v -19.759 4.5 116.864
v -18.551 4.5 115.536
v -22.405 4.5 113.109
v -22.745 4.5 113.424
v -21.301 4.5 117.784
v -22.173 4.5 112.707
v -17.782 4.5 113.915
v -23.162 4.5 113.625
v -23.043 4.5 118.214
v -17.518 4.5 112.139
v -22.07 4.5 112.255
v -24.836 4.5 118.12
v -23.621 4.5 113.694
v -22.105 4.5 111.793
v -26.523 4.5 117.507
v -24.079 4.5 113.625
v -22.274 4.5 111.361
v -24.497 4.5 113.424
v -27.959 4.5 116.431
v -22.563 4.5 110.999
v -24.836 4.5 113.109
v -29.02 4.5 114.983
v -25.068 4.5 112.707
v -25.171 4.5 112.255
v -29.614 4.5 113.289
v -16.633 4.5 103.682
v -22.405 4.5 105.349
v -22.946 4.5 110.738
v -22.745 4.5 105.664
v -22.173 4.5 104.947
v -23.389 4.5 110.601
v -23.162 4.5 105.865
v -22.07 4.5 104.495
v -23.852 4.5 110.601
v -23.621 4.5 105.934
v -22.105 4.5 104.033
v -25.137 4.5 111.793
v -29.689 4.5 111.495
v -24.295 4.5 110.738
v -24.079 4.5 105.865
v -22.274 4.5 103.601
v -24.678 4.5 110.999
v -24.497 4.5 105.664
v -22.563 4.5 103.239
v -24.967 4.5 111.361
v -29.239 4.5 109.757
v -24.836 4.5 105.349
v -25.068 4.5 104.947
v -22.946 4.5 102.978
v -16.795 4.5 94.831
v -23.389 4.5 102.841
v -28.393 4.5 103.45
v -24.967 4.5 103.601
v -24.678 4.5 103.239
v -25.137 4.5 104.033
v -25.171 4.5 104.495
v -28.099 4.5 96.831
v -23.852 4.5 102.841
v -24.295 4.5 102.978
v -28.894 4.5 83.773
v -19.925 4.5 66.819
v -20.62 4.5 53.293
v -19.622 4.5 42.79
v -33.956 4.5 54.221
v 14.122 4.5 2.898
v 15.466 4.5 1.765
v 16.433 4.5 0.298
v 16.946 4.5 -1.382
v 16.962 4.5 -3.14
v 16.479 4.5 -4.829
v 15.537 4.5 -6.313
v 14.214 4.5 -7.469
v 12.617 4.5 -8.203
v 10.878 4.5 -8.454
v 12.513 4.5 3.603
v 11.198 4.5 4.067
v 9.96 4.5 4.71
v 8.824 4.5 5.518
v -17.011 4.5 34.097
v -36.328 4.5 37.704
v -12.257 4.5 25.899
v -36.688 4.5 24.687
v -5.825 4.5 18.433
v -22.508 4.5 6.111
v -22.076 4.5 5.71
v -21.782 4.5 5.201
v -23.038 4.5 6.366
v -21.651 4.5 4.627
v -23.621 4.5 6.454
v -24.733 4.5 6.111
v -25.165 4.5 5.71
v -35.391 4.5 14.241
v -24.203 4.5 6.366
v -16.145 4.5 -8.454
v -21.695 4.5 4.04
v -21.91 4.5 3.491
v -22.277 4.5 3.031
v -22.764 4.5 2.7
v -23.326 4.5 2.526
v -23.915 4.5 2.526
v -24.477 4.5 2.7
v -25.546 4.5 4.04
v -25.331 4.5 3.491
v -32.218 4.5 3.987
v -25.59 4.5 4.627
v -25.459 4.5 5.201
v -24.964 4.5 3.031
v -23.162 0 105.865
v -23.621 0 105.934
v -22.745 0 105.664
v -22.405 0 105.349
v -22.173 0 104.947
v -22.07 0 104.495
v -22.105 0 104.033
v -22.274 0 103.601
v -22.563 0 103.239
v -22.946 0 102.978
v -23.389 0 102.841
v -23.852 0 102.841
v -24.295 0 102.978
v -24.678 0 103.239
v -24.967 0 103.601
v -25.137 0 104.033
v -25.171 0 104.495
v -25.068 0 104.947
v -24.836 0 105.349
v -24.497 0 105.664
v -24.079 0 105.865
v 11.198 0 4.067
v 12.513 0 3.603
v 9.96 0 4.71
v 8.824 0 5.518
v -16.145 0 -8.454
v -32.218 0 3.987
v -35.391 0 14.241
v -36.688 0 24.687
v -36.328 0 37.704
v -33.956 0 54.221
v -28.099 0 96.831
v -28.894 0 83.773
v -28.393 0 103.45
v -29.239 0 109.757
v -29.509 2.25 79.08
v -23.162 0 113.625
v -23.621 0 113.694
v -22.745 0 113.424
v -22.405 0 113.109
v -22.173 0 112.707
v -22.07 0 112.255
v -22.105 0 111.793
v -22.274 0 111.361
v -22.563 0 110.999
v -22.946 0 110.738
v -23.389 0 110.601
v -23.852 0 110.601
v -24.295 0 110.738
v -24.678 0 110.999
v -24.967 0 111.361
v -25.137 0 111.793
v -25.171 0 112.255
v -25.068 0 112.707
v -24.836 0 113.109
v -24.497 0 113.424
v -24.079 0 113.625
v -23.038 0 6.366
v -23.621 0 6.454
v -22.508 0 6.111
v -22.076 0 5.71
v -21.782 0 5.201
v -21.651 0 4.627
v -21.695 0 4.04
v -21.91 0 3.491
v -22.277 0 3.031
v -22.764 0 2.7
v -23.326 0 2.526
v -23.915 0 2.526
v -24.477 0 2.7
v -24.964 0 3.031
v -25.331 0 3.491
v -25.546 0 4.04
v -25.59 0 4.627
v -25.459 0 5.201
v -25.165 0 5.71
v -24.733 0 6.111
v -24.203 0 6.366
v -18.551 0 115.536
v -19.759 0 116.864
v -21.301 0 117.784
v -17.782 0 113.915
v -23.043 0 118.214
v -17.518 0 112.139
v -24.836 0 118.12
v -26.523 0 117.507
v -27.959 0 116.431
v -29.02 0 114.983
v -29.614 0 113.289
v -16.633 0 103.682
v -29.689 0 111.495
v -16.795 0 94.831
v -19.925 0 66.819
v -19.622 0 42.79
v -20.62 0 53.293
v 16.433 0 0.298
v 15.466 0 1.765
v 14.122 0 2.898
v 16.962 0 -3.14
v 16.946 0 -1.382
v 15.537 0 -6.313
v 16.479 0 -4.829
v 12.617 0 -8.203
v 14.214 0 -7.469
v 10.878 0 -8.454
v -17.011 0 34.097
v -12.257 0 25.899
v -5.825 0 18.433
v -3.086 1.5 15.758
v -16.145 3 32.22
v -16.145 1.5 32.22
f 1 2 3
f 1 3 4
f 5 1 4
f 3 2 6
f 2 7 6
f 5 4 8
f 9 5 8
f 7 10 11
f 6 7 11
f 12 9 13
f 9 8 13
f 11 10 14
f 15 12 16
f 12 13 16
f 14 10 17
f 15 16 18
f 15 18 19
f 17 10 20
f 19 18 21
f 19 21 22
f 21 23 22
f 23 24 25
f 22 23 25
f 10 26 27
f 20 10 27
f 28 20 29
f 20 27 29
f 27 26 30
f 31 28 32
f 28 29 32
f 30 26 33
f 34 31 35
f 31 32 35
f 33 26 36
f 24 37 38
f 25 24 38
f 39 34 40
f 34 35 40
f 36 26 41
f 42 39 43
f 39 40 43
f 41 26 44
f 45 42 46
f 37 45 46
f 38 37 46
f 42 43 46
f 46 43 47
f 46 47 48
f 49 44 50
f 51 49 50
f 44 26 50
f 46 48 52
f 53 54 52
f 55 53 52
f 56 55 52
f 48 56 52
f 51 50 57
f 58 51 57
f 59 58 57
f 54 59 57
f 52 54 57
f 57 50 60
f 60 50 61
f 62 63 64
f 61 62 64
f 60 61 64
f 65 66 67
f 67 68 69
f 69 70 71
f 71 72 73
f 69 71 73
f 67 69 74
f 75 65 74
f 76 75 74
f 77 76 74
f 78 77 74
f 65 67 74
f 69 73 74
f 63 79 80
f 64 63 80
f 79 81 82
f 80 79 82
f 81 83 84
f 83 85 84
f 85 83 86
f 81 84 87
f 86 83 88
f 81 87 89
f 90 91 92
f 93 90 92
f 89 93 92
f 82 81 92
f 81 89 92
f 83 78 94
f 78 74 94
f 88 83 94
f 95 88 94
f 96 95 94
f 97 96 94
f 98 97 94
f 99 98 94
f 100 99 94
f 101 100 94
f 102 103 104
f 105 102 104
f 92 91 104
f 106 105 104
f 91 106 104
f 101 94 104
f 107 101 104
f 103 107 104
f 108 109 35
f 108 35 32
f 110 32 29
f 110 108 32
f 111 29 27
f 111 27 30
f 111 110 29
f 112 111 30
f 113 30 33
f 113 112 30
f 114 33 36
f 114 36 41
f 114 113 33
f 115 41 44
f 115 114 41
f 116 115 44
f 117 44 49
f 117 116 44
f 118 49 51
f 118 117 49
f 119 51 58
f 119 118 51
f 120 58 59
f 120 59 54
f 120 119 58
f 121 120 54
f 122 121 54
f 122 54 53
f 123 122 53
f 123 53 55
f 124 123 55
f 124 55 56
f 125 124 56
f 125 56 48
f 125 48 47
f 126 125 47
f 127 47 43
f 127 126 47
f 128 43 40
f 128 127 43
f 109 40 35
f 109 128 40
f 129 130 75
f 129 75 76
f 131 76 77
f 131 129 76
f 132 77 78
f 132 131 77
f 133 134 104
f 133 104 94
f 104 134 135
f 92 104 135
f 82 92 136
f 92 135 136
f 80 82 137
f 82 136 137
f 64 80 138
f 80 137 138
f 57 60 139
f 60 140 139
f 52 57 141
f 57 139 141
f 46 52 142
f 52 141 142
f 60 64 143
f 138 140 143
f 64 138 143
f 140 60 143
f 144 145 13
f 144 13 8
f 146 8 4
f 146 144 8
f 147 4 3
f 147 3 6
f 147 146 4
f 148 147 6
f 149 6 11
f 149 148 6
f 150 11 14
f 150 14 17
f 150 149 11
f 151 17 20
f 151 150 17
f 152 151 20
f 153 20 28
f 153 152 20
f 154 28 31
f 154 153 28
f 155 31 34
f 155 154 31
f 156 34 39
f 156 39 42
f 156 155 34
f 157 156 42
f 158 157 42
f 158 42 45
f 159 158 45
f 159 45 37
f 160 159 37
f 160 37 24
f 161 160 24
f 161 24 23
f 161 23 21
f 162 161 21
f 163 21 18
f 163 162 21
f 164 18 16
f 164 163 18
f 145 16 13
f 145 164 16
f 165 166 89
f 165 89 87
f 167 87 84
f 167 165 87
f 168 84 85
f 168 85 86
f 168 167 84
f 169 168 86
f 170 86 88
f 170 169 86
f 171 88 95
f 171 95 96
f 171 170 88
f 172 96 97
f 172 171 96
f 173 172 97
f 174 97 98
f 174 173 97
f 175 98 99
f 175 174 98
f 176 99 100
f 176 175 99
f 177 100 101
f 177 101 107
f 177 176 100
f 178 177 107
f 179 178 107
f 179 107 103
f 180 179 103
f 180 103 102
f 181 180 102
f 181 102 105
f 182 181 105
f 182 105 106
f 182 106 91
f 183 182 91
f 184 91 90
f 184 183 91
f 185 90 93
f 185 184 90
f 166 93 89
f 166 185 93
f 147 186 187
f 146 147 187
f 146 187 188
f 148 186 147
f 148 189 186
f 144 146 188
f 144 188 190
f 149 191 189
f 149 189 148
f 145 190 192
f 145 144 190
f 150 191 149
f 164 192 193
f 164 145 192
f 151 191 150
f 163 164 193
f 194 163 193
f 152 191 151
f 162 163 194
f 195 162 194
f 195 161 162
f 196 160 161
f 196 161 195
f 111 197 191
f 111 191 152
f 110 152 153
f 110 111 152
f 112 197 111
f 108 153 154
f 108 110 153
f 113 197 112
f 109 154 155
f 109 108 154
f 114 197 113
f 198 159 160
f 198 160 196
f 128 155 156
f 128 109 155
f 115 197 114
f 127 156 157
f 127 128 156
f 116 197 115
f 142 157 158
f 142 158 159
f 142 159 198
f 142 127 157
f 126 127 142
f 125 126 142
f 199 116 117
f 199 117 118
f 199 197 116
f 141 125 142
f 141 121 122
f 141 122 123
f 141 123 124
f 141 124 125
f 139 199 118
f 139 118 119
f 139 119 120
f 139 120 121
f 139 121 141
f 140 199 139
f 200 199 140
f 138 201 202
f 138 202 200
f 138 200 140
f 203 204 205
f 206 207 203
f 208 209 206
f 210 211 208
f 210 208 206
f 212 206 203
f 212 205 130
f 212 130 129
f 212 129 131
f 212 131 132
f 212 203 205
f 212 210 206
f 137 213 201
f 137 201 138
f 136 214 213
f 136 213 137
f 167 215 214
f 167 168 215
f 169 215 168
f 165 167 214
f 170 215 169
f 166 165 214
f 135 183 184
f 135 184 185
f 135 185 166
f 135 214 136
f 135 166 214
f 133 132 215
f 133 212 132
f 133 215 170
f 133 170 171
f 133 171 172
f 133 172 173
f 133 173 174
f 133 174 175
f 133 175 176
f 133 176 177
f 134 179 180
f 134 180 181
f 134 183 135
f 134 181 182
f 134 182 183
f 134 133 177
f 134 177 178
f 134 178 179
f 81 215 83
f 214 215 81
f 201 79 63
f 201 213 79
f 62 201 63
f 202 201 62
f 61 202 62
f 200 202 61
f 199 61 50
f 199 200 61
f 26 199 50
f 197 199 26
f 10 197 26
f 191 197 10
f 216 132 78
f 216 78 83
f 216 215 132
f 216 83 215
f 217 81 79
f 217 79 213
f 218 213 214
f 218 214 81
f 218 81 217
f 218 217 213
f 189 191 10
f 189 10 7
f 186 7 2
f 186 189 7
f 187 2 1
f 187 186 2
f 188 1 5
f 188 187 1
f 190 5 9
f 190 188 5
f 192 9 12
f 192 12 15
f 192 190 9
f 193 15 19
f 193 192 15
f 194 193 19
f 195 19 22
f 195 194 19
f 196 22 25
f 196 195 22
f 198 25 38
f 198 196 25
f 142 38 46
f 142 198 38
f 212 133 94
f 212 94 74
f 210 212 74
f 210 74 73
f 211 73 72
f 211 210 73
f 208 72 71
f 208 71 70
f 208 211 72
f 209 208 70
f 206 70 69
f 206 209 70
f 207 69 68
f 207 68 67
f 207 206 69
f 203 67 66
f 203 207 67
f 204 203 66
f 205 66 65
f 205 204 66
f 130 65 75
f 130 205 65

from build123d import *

# Parameters (mm, degrees)
SKETCH1_R           = 1.975
SKETCH1_R_2         = 1.554999938
BOSS_EXTRUDE1_DEPTH = 4.5


with BuildPart() as part:
    # Sketch1 → Boss-Extrude1 (new body)
    with BuildSketch(Plane(origin=(0, 0, 0), x_dir=(1, 0, 0), z_dir=(0, 1, 0))):
        with BuildLine():
            Line((-16.144899663, 8.454003274), (10.877745108, 8.454003274))
            ThreePointArc((10.877745108, 8.454003274), (16.961539544, 3.139522495), (12.51277209, -3.603231306))
            ThreePointArc((12.51277209, -3.603231306), (10.56783567, -4.367093581), (8.824099884, -5.518461795))
            add(Edge.make_bspline(
                [(8.824099884, -5.518461795), (4.932532744, -8.718832913), (-4.696045283, -16.58586855), (-31.489086781, -46.943790059), (-12.894682963, -87.326546642), (-17.517744483, -112.138995974)],
                knots=[0.023478108, 0.023478108, 0.023478108, 0.023478108, 0.154944007, 0.330832674, 1, 1, 1, 1], degree=3))
            ThreePointArc((-17.517744483, -112.138995974), (-24.835663445, -118.119615453), (-29.239494185, -109.757437382))
            add(Edge.make_bspline(
                [(-32.217521916, -3.987452131), (-42.206514906, -27.827820505), (-29.561370115, -63.982250345), (-27.390169054, -99.665041987), (-29.239494185, -109.757437382)],
                knots=[0, 0, 0, 0, 0.696305279, 0.977824201, 0.977824201, 0.977824201, 0.977824201], degree=3))
            Line((-32.217521916, -3.987452131), (-16.144899663, 8.454003274))
        make_face()
        with Locations(Location((-23.620555115, -4.478995902, 0), (0, 0, 270))):
            Circle(SKETCH1_R, mode=Mode.SUBTRACT)
        with Locations(Location((-23.620555115, -112.138995974, 0), (0, 0, 270))):
            Circle(SKETCH1_R_2, mode=Mode.SUBTRACT)
        with Locations(Location((-23.620555115, -104.378996, 0), (0, 0, 270))):
            Circle(SKETCH1_R_2, mode=Mode.SUBTRACT)
    extrude(amount=BOSS_EXTRUDE1_DEPTH)


solid = part.part
